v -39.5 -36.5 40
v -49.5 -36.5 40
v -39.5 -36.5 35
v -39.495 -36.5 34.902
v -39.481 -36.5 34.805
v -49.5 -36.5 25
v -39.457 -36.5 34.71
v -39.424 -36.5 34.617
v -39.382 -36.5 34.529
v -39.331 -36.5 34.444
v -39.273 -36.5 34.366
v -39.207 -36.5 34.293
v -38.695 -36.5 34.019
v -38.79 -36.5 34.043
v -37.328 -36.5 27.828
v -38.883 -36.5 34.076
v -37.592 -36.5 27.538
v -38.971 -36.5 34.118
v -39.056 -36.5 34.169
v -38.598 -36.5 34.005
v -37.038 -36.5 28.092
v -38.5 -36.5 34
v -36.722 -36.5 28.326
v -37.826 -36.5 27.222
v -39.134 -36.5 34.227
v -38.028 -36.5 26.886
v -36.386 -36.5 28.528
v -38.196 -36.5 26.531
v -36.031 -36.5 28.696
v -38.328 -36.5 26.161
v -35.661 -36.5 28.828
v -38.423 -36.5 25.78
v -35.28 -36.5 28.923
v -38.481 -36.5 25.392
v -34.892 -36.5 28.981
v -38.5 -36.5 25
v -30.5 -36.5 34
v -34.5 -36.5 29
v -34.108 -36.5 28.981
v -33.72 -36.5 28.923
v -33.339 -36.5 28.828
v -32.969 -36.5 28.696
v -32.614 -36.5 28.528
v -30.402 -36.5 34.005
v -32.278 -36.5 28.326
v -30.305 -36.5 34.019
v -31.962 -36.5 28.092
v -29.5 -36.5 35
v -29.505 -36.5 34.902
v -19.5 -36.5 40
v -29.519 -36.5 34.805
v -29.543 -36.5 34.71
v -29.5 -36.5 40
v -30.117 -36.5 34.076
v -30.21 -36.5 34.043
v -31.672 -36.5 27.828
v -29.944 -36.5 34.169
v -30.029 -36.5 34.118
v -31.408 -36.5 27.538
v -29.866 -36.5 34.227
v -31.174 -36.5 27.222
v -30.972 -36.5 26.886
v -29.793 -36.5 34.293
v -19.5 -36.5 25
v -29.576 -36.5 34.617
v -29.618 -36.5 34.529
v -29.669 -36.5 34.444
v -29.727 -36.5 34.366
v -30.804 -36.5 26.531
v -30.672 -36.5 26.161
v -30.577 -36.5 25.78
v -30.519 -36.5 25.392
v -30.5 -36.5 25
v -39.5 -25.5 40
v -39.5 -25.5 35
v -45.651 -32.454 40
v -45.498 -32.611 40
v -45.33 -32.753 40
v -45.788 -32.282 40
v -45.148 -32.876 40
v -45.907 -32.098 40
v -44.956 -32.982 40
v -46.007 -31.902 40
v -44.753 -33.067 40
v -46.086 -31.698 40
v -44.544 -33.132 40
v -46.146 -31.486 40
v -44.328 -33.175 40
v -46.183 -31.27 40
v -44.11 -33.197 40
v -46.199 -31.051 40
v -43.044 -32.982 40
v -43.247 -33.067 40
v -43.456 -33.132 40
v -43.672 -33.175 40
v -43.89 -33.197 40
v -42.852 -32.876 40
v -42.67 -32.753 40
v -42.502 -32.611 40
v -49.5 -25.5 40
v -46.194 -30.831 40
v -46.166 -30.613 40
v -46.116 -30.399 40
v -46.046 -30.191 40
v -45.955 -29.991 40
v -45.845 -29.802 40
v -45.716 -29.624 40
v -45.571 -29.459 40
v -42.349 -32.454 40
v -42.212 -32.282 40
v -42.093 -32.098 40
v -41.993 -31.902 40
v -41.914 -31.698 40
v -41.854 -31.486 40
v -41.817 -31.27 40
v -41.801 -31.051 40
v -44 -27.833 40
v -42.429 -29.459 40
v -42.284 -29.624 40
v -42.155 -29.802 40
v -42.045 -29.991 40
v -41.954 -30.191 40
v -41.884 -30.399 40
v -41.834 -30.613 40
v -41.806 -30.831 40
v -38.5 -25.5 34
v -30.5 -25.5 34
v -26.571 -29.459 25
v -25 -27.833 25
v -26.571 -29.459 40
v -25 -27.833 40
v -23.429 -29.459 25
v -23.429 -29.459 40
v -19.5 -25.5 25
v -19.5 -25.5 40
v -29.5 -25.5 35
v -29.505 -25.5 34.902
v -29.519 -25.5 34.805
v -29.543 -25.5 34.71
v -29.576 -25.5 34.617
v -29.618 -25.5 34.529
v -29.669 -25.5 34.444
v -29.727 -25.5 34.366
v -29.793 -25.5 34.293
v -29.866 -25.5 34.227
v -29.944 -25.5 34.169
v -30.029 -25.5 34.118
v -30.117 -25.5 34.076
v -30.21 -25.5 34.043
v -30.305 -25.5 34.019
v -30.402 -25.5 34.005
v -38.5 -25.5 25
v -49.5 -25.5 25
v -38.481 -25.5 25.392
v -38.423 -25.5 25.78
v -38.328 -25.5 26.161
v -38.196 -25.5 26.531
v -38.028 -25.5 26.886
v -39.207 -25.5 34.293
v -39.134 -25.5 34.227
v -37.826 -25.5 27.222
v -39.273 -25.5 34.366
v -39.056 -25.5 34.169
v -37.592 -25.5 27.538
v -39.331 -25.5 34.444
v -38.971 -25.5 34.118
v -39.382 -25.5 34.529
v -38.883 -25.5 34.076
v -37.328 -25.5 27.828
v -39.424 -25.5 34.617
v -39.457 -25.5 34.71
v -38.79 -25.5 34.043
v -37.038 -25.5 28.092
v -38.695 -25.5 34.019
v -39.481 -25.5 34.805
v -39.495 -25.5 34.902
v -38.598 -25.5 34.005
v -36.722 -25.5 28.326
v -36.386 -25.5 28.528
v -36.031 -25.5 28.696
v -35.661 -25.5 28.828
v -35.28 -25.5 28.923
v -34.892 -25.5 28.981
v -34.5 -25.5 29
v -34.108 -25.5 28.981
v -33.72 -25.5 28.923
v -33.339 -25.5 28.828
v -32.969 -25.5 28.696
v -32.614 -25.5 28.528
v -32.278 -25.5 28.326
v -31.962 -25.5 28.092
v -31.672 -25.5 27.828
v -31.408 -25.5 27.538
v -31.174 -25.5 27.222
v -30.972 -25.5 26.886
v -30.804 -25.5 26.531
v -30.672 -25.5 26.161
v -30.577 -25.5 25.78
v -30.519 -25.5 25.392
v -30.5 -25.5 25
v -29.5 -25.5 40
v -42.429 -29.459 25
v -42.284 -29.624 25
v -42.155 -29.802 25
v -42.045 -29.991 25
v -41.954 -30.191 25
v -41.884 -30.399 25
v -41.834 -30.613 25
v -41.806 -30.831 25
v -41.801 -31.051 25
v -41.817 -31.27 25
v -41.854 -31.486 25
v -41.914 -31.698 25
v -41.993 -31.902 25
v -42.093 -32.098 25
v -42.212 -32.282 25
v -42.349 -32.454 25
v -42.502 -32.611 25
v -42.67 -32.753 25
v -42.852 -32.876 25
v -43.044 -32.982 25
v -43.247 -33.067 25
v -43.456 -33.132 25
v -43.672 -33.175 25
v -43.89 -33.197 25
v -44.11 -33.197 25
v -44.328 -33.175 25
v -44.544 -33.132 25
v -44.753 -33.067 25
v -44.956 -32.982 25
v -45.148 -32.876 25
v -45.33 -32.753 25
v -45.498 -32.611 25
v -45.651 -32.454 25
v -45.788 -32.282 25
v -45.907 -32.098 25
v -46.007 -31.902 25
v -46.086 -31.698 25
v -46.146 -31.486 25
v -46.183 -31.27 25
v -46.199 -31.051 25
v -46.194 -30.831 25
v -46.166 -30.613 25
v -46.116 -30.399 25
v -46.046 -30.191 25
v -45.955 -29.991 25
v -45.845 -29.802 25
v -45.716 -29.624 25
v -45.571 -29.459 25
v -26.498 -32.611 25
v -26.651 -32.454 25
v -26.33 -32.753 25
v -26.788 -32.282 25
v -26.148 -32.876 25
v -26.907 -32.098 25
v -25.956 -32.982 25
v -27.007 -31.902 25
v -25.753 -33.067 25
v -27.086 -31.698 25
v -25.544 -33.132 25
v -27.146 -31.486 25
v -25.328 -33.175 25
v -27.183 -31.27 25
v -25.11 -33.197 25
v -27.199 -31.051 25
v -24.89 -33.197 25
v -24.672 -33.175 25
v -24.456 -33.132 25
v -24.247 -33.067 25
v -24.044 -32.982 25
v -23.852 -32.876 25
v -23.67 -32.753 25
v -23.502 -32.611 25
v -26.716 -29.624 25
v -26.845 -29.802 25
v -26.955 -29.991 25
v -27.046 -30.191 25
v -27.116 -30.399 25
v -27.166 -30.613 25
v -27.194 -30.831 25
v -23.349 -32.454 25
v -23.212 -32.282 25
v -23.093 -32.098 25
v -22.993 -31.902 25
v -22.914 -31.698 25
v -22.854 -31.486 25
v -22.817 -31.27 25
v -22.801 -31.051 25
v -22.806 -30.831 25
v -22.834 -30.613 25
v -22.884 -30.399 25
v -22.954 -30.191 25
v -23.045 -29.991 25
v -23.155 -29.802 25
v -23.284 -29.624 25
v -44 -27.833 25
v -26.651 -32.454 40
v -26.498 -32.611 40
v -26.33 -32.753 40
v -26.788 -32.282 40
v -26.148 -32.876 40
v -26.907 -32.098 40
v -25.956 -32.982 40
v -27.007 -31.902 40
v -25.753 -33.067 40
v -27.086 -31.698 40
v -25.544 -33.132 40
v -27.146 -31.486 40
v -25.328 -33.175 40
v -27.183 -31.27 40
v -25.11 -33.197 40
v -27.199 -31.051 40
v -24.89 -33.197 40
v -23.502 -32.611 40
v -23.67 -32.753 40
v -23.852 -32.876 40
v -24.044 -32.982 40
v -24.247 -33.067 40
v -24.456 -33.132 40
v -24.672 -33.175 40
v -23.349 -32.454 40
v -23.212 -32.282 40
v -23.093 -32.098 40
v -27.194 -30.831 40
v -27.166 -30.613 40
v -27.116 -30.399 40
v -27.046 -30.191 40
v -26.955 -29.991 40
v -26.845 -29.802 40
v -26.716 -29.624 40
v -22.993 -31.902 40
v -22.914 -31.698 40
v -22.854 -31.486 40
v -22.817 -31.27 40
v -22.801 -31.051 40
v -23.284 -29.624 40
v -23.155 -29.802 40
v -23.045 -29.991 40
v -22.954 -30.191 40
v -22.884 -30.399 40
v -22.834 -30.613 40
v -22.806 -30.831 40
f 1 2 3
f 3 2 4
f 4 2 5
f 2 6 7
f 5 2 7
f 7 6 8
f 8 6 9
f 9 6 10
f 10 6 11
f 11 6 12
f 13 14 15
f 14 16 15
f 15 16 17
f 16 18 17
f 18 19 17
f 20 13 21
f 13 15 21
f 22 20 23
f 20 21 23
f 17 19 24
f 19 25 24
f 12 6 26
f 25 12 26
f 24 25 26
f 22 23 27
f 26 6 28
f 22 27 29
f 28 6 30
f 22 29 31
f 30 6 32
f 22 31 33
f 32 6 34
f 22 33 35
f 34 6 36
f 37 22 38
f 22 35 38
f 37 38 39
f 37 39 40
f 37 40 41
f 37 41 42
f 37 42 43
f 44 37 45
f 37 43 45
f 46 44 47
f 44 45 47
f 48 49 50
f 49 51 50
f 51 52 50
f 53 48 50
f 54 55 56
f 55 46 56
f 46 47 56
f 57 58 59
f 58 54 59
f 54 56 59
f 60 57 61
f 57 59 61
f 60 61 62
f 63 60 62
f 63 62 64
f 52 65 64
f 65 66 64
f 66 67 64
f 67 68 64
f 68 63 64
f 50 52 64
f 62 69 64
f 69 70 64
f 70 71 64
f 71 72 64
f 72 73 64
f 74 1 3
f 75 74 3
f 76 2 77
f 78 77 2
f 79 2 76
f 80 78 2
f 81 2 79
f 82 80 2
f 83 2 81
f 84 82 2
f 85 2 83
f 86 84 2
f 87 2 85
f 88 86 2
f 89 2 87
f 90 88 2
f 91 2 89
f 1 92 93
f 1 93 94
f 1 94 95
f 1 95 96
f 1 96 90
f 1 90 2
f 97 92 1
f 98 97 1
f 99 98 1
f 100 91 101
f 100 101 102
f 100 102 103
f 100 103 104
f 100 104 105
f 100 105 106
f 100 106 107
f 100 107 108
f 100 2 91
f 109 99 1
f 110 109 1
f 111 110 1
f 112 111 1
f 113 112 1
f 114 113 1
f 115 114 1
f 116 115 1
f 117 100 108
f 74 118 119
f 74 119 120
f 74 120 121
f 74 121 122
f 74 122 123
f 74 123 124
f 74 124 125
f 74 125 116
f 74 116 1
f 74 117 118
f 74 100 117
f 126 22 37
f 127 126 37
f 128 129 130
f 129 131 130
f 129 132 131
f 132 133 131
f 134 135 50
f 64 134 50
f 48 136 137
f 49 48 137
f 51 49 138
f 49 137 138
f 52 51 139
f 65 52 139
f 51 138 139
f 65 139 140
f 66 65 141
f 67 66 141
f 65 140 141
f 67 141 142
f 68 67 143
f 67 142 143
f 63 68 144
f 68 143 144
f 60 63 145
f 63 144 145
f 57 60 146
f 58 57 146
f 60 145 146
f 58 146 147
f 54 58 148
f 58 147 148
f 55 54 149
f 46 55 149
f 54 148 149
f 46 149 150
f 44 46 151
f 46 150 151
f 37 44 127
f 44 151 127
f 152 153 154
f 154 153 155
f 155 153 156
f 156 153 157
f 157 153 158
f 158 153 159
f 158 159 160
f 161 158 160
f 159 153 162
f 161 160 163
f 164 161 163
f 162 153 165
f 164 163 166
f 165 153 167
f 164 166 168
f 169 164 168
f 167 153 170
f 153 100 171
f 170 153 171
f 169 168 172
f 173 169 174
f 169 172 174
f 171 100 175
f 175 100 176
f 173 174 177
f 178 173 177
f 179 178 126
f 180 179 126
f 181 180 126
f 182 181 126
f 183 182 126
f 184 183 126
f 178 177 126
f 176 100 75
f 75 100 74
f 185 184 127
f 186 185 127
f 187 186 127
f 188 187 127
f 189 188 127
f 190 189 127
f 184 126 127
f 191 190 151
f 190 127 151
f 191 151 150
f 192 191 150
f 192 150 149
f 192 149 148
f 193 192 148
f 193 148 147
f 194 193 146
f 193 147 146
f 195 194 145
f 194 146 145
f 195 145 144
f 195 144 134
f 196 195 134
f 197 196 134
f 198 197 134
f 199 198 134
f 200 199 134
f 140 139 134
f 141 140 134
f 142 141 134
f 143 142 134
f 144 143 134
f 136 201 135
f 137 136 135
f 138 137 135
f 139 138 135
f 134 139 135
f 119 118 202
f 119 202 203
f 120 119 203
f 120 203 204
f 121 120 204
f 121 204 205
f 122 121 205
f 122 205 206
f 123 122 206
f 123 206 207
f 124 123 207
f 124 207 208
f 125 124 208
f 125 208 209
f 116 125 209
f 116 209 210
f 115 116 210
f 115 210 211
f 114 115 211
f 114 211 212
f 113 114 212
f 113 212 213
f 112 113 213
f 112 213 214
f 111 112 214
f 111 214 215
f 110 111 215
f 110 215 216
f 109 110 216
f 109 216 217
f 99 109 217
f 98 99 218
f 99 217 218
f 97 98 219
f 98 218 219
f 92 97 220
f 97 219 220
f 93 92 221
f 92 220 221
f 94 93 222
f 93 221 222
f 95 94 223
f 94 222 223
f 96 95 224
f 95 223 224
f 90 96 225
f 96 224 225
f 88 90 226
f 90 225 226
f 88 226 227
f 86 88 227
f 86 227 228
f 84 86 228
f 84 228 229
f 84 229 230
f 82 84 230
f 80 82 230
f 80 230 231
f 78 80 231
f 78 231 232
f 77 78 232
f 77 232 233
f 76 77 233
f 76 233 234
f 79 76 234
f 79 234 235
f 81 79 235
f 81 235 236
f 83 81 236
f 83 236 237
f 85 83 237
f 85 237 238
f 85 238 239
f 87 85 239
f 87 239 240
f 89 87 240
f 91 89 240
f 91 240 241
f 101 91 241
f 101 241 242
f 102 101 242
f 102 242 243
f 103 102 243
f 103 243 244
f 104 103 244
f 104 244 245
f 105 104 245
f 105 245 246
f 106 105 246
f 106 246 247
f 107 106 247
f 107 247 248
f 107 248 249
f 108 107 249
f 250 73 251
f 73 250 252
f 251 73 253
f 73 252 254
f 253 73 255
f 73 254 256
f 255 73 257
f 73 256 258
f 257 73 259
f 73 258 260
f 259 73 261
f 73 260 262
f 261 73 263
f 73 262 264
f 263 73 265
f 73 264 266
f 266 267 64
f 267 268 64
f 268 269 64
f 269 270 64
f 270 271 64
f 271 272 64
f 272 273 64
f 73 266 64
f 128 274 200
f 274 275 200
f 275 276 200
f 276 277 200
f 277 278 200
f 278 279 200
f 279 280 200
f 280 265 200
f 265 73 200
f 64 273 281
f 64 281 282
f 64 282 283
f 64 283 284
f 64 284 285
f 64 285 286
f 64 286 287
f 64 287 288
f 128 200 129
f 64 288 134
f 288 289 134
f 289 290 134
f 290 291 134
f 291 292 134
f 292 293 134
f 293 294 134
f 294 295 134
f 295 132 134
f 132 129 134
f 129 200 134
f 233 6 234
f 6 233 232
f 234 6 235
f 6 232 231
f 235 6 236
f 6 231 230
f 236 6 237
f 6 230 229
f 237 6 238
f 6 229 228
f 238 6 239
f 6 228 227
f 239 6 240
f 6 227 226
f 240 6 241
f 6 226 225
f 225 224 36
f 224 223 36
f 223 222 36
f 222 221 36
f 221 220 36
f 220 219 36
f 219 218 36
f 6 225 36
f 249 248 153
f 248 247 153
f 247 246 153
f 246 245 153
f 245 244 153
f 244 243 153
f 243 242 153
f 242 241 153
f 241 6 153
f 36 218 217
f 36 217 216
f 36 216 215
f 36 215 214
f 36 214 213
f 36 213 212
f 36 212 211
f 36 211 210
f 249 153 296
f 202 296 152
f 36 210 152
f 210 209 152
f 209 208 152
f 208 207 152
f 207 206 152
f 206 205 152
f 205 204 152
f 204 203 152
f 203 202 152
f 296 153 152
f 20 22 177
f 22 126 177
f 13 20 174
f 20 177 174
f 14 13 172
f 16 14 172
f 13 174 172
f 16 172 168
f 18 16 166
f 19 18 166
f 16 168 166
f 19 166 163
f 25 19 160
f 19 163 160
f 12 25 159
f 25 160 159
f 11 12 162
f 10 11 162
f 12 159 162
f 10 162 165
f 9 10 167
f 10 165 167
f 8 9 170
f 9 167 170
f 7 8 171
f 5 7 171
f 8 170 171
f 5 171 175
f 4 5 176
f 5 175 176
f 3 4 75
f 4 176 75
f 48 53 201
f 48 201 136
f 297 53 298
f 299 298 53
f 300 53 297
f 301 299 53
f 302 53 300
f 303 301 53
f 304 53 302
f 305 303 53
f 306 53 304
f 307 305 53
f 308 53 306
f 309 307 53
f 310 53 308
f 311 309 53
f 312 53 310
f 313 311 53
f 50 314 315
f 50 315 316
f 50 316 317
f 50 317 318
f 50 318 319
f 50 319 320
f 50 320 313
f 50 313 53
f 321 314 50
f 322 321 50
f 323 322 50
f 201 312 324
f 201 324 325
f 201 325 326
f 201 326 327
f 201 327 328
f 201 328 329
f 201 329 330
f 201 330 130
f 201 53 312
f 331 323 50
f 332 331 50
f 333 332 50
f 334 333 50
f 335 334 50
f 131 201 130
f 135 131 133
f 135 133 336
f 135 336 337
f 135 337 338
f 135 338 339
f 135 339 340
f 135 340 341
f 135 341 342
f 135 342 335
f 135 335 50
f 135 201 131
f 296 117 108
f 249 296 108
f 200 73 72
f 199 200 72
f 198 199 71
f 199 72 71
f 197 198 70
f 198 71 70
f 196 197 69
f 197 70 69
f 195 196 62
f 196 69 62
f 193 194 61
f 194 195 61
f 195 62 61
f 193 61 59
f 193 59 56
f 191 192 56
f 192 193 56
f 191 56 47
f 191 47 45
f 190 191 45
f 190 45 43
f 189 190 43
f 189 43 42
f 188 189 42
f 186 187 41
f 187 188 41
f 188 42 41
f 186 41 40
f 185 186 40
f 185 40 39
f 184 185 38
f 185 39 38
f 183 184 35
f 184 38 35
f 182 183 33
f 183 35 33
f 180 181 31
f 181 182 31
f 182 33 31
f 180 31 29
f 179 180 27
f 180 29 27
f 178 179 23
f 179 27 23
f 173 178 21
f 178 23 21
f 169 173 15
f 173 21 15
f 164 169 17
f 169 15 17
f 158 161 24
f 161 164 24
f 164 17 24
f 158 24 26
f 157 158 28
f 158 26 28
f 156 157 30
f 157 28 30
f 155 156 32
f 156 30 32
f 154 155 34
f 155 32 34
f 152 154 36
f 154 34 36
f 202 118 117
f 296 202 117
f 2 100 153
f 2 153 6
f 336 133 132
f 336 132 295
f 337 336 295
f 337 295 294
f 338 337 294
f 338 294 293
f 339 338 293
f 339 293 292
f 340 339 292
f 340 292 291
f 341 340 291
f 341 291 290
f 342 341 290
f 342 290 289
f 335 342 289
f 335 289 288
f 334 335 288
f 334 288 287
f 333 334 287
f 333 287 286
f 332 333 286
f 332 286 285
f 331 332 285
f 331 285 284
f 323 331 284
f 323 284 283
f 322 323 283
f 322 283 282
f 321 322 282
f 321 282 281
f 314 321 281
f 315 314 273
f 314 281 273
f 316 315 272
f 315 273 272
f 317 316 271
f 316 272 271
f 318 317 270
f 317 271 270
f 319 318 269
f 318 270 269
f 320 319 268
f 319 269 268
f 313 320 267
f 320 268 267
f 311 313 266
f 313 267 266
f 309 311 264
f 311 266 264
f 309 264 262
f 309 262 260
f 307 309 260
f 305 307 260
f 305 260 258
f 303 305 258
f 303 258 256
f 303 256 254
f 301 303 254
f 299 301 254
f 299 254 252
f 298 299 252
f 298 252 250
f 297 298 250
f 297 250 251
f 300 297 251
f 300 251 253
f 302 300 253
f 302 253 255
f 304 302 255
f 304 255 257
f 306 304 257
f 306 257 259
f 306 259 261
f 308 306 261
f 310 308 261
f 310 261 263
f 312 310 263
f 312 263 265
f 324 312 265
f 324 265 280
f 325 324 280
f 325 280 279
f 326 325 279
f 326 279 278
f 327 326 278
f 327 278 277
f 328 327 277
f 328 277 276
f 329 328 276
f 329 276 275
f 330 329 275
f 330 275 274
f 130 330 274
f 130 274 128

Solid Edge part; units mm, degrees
sketch "Sketch1" plane through (0, 0, 25) normal (0, 0, 1) x (1, 0, 0)
  line L0 (-49.5, -36.5) -> (-19.5, -36.5)
  line L1 (-19.5, 6.5) -> (-19.5, -36.5)
  line L2 (-19.5, 6.5) -> (-49.5, 6.5)
  line L3 (-49.5, 6.5) -> (-49.5, -36.5)
  circle A0 centre (-25, -31) radius 2.2
  circle A1 centre (-44, 1) radius 2.2
  circle A2 centre (-25, 1) radius 2.2
  circle A3 centre (-44, -31) radius 2.2
extrude "ExtrudedProtrusion_1" add sketch "Sketch1" along normal blind 15
sketch "Sketch2" plane through (-34.5, -36.5, 32.5) normal (0, -1, 0) x (0, 0, 1)
  circle A0 centre (-7.5, 0) radius 4
extrude "Cutout1" cut sketch "Sketch2" against normal through all
sketch "Sketch3" plane through (-34.5, -36.5, 32.5) normal (0, -1, 0) x (1, 0, 0)
  line L0 (-5, 7.5) -> (-5, 1.5)
  line L1 (-5, 1.5) -> (5, 1.5)
  line L2 (5, 7.5) -> (5, 1.5)
  dimension "D1" = 5
  dimension "D2" = 10
extrude "Cutout2" cut sketch "Sketch3" against normal through all material side at (-39.45, -36.5, 37)
sketch "Sketch4" plane through (-24.5, -15, 40) normal (0, 0, 1) x (0, 1, 0)
  line L0 (-10.5, 25) -> (-10.5, 12.5)
extrude "Cutout3" cut sketch "Sketch4" against normal through all material side at (-43.25, -25.45, 40)
fillet "Round_1" radius 1 2 edges at (-39.5, -31, 34) (-29.5, -31, 34)
sketch "Sketch5" plane through (-44.5, -31, 40) normal (0, 0, 1) x (1, 0, 0)
  line L0 (0.5, 0) -> (2.0825, 1.5282)
  line L1 (2.0825, 1.5282) -> (0.5, 3.167)
  line L2 (0.5, 3.167) -> (-1.0825, 1.5282)
  line L3 (-1.0825, 1.5282) -> (0.5, 0)
  line L4 (19.5, 0) -> (21.0825, 1.5282)
  line L5 (21.0825, 1.5282) -> (19.5, 3.167)
  line L6 (19.5, 3.167) -> (17.9175, 1.5282)
  line L7 (17.9175, 1.5282) -> (19.5, 0)
extrude "Cutout4" cut sketch "Sketch5" against normal through all
